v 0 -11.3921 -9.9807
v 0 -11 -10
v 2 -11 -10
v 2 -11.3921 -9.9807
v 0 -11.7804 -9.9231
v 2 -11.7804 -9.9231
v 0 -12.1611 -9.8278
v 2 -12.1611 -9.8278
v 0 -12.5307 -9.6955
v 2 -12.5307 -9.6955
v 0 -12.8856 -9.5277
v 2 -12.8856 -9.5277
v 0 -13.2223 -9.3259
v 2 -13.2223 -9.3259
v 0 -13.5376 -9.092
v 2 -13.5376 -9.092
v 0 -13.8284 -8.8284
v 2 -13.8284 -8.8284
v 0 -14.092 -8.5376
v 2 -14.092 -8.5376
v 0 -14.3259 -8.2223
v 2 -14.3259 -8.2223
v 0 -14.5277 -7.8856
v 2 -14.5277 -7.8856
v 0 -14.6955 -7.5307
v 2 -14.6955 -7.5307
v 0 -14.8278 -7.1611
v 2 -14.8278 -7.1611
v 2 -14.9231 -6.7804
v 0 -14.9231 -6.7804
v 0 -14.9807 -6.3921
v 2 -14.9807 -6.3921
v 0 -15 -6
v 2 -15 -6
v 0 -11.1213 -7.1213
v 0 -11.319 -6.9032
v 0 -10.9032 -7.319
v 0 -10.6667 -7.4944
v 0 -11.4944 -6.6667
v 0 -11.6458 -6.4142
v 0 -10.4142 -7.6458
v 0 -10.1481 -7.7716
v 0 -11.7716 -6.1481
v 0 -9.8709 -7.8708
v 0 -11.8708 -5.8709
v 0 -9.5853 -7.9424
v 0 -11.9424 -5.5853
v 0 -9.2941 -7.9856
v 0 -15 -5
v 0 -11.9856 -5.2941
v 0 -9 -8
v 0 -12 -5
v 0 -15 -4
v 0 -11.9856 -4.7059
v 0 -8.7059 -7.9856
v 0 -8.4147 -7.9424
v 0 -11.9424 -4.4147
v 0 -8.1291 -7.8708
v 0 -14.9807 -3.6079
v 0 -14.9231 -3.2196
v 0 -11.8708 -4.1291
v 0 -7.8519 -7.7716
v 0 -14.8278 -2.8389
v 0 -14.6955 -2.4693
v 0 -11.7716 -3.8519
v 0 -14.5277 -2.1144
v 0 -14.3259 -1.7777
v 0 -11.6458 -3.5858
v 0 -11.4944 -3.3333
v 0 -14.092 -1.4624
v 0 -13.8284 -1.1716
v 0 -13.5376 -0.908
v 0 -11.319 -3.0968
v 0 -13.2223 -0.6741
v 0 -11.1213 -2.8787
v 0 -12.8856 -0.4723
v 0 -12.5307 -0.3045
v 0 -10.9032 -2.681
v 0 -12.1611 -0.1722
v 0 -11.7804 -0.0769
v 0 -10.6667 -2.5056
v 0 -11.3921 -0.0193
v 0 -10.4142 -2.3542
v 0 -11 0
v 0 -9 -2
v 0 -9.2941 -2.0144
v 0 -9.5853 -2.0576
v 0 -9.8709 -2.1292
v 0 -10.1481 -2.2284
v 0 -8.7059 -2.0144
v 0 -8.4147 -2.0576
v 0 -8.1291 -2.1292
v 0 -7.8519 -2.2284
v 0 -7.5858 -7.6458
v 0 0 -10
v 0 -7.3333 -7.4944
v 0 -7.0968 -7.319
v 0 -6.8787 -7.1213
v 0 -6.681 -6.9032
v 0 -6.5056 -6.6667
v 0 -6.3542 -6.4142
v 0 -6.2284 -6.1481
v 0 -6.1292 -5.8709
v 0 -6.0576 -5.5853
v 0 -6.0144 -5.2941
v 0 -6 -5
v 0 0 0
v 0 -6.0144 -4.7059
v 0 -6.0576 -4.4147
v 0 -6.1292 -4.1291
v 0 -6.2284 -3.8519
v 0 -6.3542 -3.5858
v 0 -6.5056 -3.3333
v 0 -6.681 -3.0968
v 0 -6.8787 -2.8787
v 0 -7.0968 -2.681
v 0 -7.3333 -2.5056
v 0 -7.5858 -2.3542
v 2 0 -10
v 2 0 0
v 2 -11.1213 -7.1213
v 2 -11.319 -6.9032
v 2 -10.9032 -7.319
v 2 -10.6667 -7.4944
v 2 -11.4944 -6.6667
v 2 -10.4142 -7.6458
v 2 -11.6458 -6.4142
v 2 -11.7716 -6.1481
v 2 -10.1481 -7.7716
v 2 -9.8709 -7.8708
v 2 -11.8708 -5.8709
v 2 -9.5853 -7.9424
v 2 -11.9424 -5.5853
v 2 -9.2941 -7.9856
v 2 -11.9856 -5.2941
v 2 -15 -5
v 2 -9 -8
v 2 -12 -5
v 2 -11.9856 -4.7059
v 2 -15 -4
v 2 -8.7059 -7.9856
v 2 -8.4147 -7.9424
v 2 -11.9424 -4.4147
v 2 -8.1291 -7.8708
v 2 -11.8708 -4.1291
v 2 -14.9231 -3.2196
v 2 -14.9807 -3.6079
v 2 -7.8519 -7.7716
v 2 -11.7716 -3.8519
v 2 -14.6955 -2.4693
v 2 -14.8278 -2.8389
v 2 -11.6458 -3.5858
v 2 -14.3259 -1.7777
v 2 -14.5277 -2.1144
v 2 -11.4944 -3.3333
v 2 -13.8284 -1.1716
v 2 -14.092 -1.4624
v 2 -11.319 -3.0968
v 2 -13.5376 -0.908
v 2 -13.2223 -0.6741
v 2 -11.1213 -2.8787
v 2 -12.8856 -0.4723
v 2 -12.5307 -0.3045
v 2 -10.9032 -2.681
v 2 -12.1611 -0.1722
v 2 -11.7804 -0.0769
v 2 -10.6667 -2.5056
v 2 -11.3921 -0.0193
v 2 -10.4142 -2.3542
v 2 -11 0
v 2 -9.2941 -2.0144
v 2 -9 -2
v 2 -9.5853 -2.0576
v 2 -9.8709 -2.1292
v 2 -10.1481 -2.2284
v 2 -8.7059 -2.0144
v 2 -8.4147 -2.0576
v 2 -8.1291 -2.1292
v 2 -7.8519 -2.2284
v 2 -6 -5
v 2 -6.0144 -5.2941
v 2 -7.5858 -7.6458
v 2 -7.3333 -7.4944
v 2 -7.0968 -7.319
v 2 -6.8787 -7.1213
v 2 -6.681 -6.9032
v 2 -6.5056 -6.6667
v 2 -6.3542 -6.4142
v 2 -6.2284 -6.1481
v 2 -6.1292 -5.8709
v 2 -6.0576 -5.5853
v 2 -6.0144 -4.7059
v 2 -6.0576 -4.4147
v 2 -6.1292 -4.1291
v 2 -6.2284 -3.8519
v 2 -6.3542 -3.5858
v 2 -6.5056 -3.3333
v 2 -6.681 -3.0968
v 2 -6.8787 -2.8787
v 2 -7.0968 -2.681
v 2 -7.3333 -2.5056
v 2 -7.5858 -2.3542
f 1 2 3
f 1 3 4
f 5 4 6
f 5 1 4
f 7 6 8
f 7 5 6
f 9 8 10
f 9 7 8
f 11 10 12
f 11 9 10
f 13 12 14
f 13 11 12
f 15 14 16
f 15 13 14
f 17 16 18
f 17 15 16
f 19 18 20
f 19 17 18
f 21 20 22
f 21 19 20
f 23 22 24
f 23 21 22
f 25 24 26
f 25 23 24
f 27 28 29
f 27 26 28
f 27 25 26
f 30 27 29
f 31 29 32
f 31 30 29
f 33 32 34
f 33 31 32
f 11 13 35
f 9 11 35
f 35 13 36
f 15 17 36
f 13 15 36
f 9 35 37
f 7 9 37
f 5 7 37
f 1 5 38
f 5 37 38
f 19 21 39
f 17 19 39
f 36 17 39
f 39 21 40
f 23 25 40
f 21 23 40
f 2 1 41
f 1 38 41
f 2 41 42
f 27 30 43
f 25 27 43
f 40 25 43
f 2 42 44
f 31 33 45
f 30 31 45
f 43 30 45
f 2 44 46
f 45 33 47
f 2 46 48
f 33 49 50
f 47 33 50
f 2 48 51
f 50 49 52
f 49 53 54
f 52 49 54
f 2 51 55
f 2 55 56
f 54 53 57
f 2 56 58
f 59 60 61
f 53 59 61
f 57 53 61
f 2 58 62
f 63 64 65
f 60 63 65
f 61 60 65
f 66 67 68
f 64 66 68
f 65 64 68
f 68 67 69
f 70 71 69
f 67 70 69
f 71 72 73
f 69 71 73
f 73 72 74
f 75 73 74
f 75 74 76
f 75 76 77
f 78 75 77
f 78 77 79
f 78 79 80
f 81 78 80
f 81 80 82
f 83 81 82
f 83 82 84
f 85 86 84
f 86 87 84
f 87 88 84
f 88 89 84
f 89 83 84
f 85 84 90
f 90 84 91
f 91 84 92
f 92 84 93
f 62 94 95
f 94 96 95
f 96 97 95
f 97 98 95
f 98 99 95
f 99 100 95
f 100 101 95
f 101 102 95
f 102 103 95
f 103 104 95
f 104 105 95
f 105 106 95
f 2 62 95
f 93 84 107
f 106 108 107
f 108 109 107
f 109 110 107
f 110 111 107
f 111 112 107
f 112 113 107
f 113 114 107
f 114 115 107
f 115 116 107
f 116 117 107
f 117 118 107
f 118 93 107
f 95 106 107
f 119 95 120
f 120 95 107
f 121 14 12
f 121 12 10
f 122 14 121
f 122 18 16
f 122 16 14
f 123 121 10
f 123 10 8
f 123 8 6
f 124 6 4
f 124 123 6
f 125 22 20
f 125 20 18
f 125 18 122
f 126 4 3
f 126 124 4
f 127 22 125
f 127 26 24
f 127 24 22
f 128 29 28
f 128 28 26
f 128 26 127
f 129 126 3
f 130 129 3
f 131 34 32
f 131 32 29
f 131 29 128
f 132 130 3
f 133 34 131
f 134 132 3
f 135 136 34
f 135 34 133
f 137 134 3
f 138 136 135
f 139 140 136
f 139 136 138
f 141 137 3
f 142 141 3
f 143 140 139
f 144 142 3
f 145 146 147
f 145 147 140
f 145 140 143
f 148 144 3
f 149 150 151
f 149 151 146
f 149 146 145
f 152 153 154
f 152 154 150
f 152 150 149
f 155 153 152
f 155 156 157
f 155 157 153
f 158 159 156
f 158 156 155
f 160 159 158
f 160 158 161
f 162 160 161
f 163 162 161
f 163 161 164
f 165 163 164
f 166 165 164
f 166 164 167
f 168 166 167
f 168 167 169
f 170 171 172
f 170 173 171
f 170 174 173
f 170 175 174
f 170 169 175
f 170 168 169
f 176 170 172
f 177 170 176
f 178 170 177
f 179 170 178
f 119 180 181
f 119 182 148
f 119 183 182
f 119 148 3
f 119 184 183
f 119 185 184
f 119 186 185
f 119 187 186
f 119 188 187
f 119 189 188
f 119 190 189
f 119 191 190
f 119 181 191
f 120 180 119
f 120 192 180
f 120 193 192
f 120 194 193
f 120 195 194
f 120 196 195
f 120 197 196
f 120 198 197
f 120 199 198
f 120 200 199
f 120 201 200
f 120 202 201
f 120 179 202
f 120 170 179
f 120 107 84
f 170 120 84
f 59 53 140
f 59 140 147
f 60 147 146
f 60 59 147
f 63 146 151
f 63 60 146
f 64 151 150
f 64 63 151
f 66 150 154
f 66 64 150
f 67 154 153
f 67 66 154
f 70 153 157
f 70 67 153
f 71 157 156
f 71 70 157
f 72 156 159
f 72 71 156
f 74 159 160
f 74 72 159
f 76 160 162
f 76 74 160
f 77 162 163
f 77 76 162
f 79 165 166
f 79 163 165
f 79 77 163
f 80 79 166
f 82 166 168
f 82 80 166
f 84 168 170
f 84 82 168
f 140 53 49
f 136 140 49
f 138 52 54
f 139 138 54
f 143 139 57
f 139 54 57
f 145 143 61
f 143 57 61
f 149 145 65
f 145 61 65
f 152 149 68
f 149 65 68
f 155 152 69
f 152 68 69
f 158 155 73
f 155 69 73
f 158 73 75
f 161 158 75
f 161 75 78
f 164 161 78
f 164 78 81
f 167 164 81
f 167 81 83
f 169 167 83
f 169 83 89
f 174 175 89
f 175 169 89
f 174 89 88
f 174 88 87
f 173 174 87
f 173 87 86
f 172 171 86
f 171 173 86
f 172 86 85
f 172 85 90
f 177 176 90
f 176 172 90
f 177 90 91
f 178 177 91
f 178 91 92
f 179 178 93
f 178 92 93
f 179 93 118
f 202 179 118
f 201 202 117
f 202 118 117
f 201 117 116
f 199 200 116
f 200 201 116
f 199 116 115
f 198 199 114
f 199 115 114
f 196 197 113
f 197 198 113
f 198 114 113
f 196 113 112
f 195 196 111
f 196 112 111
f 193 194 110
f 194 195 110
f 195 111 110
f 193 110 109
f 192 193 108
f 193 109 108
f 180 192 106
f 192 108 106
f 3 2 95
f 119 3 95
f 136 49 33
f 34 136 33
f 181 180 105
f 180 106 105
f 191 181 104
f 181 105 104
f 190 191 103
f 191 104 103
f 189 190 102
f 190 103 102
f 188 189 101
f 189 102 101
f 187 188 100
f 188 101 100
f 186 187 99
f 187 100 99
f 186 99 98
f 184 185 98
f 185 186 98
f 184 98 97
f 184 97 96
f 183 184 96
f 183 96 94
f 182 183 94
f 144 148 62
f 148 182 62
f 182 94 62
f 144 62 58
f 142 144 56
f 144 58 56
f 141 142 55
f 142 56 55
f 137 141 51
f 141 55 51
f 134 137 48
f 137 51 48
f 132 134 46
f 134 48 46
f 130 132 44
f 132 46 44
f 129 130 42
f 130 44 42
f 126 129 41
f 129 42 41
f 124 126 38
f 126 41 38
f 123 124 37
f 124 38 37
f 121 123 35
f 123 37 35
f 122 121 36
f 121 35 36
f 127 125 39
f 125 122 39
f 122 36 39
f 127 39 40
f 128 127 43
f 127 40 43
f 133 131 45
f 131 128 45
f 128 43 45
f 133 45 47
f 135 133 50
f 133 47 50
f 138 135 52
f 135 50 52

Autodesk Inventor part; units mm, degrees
ref_plane "YZ Plane" through (0, 0, 0) normal (1, 0, 0) x (0, 1, 0)
ref_plane "XZ Plane" through (0, 0, 0) normal (0, 1, 0) x (-1, 0, 0)
ref_plane "XY Plane" through (0, 0, 0) normal (0, 0, 1) x (1, 0, 0)
sketch "Esboço1" plane through (0, 0, 0) normal (1, 0, 0) x (0, 1, 0)
  line L0 (0, 0) -> (-11, 0)
  line L1 (-15, -4) -> (-15, -6)
  line L2 (-11, -10) -> (0, -10)
  line L3 (0, -10) -> (0, 0)
  arc A0 (-11, 0) -> (-15, -4) centre (-11, -4) ccw
  arc A1 (-15, -6) -> (-11, -10) centre (-11, -6) ccw
  line L4 (-15, -5) -> (-9, -5)
  circle A2 centre (-9, -5) radius 3
  point P0 (-15, -10)
  point P1 (-15, 0)
  dimension "d0" = 15
  dimension "d1" = 10
  dimension "d2" = 4
  dimension "d3" = 6
  dimension "d4" = 6
extrude "Extrusão1" add sketch "Esboço1" along normal blind 2
sketch "Esboço2" plane through (2, 0, 0) normal (1, 0, 0) x (0, 0, -1)
  circle A0 centre (5, -9) radius 3 projected
properties part number "Chapa da Luz de Freio"
